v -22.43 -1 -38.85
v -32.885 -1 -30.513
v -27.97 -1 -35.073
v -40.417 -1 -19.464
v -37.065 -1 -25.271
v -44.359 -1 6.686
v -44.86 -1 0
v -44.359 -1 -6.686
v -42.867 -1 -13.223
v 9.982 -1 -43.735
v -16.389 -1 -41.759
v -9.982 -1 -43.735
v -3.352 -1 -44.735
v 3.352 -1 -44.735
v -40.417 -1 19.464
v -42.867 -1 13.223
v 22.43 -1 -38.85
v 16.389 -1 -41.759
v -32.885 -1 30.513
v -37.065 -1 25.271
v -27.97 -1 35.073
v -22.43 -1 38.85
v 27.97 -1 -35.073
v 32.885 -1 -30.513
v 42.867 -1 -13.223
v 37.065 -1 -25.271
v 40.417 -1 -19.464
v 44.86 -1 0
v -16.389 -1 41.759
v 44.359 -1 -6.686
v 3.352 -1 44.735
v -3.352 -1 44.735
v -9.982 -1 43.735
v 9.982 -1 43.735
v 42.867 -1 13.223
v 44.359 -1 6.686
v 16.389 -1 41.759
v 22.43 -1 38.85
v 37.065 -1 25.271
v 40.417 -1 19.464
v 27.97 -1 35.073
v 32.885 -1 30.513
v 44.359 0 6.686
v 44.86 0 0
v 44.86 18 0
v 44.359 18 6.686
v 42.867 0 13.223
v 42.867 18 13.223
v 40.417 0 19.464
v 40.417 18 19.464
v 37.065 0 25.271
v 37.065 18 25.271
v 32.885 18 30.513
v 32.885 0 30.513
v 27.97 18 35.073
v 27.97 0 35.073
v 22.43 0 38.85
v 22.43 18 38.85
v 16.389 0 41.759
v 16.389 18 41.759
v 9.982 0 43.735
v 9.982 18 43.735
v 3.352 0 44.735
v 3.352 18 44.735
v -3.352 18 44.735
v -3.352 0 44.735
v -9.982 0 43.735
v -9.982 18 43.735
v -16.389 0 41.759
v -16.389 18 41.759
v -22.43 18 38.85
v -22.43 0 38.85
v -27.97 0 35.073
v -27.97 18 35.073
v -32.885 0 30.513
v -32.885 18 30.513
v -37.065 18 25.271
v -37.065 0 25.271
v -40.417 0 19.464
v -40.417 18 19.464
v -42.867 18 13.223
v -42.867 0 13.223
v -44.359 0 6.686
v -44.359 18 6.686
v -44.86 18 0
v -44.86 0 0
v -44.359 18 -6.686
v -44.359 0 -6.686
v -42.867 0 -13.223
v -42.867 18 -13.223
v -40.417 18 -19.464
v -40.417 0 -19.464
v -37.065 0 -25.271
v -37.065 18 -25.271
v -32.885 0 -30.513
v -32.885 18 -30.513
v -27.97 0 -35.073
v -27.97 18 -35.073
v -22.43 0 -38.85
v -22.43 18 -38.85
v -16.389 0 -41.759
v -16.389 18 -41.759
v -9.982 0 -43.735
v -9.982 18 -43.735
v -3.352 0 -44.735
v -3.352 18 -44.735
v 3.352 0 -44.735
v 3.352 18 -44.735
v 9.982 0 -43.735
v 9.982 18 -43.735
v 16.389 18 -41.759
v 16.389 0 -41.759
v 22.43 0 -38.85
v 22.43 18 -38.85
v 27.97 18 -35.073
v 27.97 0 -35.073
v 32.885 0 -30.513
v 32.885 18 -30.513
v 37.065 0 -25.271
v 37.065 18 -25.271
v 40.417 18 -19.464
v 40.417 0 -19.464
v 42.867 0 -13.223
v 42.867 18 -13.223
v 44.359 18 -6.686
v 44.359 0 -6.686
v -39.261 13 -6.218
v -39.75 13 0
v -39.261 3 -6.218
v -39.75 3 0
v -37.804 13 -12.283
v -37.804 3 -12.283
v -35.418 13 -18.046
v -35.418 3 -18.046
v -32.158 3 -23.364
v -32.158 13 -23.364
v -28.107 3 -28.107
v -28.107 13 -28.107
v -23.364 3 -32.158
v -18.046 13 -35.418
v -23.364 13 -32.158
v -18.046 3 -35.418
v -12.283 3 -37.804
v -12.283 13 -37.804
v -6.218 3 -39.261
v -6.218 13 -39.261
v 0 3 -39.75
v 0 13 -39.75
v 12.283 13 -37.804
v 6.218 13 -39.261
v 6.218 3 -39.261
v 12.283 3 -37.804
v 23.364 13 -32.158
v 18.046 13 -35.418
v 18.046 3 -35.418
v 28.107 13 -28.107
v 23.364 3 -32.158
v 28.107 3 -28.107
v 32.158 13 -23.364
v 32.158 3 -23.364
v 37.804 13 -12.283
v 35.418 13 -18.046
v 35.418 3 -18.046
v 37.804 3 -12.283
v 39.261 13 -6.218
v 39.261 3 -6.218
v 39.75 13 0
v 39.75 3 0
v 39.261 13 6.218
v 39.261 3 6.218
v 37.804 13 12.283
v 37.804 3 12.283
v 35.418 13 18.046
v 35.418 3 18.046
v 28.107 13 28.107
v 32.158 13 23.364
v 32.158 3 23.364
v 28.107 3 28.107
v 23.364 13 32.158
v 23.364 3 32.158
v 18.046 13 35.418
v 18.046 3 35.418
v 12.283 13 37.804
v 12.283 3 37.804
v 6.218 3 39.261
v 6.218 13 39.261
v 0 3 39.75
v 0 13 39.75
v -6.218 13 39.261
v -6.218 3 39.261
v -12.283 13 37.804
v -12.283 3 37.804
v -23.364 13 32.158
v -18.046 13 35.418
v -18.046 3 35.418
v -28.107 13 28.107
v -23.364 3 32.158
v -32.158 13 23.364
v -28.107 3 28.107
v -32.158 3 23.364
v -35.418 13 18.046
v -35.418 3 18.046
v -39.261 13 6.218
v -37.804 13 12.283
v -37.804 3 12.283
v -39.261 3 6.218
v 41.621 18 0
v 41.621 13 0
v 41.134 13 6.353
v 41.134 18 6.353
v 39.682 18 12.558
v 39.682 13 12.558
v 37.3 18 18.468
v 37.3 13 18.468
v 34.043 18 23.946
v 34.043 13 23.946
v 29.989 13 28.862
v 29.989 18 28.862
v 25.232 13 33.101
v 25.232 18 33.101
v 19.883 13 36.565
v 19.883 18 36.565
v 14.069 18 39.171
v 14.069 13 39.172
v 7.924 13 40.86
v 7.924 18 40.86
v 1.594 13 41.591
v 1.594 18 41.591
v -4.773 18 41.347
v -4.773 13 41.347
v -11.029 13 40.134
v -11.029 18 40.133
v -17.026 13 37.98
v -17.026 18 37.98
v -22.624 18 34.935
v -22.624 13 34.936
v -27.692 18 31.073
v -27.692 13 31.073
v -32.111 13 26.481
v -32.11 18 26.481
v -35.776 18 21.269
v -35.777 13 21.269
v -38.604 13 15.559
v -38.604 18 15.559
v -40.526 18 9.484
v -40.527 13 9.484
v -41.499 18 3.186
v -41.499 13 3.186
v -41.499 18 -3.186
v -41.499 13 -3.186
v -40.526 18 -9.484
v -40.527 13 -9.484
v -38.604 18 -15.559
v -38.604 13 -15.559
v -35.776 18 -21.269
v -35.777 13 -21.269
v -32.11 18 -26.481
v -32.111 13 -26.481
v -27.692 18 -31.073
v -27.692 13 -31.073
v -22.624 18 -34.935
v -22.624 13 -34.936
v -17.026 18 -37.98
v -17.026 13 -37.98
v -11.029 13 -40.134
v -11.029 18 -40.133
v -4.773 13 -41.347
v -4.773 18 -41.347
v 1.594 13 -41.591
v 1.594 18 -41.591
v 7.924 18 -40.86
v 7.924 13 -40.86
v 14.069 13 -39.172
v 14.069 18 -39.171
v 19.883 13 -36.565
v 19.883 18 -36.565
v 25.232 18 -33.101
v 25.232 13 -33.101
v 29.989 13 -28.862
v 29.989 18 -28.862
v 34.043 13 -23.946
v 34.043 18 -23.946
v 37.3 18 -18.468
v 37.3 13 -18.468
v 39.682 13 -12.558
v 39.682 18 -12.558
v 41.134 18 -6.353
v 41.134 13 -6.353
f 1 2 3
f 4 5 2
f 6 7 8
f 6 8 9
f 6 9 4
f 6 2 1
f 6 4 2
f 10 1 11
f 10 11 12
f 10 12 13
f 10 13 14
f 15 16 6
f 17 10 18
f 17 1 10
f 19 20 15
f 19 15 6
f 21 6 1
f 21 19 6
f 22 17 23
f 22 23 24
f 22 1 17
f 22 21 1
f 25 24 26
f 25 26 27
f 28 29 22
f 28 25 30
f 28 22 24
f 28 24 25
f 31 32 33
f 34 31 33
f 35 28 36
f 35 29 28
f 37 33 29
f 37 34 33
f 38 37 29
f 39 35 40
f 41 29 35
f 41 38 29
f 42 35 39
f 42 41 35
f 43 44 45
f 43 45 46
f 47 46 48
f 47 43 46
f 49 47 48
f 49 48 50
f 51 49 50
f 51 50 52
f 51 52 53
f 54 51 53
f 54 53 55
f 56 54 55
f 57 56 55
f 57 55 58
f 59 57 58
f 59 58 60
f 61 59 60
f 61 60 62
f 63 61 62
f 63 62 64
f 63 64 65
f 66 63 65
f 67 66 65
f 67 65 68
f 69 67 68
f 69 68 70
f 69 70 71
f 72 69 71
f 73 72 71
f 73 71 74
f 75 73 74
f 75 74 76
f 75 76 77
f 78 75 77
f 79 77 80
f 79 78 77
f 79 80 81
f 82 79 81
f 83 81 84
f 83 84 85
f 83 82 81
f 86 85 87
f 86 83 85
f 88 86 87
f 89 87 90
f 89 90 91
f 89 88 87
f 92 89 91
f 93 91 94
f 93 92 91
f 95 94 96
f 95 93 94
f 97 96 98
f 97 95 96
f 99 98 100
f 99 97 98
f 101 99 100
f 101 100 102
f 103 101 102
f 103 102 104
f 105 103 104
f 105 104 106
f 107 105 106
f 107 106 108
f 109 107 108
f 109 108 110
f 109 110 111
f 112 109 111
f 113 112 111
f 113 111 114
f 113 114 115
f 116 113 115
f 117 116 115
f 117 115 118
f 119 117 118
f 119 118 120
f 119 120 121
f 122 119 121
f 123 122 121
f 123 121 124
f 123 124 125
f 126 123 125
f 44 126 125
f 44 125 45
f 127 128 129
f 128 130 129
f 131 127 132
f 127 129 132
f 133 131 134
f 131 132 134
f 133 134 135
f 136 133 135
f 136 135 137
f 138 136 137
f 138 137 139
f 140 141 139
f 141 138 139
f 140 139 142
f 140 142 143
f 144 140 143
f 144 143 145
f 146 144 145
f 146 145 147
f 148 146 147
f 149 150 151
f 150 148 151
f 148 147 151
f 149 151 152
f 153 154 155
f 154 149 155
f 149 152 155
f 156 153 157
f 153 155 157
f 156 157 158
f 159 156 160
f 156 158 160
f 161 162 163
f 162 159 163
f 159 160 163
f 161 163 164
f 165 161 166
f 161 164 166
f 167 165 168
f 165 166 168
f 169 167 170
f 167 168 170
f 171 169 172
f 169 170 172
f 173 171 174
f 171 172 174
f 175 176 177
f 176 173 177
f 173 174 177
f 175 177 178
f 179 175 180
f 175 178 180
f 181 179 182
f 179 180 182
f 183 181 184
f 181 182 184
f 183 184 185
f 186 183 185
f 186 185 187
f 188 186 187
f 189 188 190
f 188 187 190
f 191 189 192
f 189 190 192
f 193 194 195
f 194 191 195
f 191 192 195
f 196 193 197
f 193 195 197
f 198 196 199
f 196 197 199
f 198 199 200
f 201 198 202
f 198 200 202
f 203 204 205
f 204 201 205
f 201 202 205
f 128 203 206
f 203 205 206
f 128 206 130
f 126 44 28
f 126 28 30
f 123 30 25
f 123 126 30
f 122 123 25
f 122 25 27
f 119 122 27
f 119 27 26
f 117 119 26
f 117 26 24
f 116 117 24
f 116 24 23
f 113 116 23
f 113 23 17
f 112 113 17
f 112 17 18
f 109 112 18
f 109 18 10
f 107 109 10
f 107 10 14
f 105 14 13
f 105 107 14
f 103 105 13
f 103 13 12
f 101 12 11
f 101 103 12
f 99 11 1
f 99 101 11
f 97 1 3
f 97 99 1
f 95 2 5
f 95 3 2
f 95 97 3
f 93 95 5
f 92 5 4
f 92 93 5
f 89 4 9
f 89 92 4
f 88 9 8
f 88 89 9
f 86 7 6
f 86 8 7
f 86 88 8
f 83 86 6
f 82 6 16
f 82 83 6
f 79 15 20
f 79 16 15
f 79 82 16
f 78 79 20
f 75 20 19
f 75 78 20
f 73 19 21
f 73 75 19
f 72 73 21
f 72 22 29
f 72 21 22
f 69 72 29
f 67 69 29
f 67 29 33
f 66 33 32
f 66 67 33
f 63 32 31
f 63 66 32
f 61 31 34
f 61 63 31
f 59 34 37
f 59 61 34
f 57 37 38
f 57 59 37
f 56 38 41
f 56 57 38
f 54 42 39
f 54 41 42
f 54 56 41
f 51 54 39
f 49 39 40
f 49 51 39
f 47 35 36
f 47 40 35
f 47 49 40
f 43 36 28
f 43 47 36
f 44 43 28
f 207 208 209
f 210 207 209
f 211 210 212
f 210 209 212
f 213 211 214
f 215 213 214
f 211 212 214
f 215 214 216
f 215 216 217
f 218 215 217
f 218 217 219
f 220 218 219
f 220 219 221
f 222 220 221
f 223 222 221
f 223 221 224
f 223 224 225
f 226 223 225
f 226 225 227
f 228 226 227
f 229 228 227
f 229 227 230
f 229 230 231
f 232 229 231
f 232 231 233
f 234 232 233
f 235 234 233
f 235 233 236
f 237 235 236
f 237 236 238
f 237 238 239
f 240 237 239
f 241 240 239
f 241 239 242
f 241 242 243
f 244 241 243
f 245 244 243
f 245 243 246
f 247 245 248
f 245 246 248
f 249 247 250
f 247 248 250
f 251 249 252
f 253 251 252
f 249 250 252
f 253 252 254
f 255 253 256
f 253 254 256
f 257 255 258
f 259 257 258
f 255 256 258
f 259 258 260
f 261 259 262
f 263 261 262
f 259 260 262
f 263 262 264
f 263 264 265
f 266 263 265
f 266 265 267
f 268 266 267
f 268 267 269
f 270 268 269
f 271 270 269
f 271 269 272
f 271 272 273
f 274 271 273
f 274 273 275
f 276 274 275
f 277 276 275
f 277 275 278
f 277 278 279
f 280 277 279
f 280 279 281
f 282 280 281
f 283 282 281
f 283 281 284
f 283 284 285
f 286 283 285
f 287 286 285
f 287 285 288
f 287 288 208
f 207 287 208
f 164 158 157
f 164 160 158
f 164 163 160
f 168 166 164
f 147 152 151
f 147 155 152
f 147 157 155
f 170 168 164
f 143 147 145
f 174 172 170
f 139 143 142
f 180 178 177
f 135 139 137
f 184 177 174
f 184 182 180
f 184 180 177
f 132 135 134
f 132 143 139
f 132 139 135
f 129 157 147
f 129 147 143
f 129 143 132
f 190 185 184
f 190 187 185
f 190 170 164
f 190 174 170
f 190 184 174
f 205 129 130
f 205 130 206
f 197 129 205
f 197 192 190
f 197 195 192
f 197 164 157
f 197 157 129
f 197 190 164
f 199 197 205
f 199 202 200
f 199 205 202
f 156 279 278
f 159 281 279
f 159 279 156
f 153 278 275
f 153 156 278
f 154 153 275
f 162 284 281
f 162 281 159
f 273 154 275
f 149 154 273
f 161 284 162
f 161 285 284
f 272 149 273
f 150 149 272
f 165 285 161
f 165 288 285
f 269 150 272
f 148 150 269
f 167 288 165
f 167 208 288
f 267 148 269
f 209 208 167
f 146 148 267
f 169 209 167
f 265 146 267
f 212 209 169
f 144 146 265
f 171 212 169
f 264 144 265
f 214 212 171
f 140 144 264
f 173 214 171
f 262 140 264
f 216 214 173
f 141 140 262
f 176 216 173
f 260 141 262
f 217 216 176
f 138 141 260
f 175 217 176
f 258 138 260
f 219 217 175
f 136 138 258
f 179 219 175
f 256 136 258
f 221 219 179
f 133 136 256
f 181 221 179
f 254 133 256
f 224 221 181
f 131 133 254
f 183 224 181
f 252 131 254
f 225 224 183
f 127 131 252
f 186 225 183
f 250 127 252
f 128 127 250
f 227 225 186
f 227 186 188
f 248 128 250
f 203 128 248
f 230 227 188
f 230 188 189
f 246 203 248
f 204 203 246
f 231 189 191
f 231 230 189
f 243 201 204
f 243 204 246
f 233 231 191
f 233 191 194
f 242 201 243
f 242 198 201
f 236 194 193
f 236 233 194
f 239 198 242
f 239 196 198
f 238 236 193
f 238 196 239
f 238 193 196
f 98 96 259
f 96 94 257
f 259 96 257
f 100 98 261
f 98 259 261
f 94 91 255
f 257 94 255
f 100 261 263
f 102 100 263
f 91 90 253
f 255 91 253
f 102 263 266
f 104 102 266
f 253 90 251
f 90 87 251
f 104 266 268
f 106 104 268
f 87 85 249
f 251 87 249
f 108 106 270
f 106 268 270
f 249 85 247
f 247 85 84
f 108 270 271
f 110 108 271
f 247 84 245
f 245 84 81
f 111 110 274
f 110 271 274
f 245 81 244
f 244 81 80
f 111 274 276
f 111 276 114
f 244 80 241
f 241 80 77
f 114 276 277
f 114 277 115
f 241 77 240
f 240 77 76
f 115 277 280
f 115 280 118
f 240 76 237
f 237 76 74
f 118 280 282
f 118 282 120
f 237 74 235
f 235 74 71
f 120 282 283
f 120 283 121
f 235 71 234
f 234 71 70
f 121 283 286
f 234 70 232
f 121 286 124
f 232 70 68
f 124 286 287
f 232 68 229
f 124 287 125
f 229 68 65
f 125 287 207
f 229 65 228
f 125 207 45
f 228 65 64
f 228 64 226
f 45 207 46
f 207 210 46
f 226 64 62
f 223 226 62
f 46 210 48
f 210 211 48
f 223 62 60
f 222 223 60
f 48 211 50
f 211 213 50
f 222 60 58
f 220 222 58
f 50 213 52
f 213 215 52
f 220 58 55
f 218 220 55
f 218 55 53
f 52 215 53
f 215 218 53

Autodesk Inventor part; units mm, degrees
ref_plane "YZ Plane" through (0, 0, 0) normal (1, 0, 0) x (0, 1, 0)
ref_plane "XZ Plane" through (0, 0, 0) normal (0, 1, 0) x (-1, 0, 0)
ref_plane "XY Plane" through (0, 0, 0) normal (0, 0, 1) x (1, 0, 0)
sketch "Sketch4" plane through (0, 0, 0) normal (0, 1, 0) x (-1, 0, 0)
  circle A0 centre (0, 0) radius 39.75
  circle A1 centre (0, 0) radius 41.6215
  circle A2 centre (0, 0) radius 41.6213
  dimension "d17" = 79.5
  dimension "d18" = 83.243
sketch "Sketch6" plane through (0, 0, 0) normal (0, 1, 0) x (-1, 0, 0)
  circle A0 centre (0, 0) radius 39.7618
extrude "Extrusion1" add sketch "Sketch6" along normal blind 3
extrude "Extrusion2" add sketch "Sketch4" along normal blind 13
sketch "Sketch7" plane through (0, 0, 0) normal (0, -1, 0) x (1, 0, 0)
  circle A0 centre (0, 0) radius 44.86
  circle A1 centre (0, 0) radius 41.6213
extrude "Extrusion3" add sketch "Sketch7" against normal blind 18
sketch "Sketch8" plane through (0, 0, 0) normal (0, -1, 0) x (1, 0, 0)
  circle A0 centre (0, 0) radius 44.86
extrude "Extrusion4" add sketch "Sketch8" along normal blind 1
properties part number "Soft Coating Gripper mold_10mil"
